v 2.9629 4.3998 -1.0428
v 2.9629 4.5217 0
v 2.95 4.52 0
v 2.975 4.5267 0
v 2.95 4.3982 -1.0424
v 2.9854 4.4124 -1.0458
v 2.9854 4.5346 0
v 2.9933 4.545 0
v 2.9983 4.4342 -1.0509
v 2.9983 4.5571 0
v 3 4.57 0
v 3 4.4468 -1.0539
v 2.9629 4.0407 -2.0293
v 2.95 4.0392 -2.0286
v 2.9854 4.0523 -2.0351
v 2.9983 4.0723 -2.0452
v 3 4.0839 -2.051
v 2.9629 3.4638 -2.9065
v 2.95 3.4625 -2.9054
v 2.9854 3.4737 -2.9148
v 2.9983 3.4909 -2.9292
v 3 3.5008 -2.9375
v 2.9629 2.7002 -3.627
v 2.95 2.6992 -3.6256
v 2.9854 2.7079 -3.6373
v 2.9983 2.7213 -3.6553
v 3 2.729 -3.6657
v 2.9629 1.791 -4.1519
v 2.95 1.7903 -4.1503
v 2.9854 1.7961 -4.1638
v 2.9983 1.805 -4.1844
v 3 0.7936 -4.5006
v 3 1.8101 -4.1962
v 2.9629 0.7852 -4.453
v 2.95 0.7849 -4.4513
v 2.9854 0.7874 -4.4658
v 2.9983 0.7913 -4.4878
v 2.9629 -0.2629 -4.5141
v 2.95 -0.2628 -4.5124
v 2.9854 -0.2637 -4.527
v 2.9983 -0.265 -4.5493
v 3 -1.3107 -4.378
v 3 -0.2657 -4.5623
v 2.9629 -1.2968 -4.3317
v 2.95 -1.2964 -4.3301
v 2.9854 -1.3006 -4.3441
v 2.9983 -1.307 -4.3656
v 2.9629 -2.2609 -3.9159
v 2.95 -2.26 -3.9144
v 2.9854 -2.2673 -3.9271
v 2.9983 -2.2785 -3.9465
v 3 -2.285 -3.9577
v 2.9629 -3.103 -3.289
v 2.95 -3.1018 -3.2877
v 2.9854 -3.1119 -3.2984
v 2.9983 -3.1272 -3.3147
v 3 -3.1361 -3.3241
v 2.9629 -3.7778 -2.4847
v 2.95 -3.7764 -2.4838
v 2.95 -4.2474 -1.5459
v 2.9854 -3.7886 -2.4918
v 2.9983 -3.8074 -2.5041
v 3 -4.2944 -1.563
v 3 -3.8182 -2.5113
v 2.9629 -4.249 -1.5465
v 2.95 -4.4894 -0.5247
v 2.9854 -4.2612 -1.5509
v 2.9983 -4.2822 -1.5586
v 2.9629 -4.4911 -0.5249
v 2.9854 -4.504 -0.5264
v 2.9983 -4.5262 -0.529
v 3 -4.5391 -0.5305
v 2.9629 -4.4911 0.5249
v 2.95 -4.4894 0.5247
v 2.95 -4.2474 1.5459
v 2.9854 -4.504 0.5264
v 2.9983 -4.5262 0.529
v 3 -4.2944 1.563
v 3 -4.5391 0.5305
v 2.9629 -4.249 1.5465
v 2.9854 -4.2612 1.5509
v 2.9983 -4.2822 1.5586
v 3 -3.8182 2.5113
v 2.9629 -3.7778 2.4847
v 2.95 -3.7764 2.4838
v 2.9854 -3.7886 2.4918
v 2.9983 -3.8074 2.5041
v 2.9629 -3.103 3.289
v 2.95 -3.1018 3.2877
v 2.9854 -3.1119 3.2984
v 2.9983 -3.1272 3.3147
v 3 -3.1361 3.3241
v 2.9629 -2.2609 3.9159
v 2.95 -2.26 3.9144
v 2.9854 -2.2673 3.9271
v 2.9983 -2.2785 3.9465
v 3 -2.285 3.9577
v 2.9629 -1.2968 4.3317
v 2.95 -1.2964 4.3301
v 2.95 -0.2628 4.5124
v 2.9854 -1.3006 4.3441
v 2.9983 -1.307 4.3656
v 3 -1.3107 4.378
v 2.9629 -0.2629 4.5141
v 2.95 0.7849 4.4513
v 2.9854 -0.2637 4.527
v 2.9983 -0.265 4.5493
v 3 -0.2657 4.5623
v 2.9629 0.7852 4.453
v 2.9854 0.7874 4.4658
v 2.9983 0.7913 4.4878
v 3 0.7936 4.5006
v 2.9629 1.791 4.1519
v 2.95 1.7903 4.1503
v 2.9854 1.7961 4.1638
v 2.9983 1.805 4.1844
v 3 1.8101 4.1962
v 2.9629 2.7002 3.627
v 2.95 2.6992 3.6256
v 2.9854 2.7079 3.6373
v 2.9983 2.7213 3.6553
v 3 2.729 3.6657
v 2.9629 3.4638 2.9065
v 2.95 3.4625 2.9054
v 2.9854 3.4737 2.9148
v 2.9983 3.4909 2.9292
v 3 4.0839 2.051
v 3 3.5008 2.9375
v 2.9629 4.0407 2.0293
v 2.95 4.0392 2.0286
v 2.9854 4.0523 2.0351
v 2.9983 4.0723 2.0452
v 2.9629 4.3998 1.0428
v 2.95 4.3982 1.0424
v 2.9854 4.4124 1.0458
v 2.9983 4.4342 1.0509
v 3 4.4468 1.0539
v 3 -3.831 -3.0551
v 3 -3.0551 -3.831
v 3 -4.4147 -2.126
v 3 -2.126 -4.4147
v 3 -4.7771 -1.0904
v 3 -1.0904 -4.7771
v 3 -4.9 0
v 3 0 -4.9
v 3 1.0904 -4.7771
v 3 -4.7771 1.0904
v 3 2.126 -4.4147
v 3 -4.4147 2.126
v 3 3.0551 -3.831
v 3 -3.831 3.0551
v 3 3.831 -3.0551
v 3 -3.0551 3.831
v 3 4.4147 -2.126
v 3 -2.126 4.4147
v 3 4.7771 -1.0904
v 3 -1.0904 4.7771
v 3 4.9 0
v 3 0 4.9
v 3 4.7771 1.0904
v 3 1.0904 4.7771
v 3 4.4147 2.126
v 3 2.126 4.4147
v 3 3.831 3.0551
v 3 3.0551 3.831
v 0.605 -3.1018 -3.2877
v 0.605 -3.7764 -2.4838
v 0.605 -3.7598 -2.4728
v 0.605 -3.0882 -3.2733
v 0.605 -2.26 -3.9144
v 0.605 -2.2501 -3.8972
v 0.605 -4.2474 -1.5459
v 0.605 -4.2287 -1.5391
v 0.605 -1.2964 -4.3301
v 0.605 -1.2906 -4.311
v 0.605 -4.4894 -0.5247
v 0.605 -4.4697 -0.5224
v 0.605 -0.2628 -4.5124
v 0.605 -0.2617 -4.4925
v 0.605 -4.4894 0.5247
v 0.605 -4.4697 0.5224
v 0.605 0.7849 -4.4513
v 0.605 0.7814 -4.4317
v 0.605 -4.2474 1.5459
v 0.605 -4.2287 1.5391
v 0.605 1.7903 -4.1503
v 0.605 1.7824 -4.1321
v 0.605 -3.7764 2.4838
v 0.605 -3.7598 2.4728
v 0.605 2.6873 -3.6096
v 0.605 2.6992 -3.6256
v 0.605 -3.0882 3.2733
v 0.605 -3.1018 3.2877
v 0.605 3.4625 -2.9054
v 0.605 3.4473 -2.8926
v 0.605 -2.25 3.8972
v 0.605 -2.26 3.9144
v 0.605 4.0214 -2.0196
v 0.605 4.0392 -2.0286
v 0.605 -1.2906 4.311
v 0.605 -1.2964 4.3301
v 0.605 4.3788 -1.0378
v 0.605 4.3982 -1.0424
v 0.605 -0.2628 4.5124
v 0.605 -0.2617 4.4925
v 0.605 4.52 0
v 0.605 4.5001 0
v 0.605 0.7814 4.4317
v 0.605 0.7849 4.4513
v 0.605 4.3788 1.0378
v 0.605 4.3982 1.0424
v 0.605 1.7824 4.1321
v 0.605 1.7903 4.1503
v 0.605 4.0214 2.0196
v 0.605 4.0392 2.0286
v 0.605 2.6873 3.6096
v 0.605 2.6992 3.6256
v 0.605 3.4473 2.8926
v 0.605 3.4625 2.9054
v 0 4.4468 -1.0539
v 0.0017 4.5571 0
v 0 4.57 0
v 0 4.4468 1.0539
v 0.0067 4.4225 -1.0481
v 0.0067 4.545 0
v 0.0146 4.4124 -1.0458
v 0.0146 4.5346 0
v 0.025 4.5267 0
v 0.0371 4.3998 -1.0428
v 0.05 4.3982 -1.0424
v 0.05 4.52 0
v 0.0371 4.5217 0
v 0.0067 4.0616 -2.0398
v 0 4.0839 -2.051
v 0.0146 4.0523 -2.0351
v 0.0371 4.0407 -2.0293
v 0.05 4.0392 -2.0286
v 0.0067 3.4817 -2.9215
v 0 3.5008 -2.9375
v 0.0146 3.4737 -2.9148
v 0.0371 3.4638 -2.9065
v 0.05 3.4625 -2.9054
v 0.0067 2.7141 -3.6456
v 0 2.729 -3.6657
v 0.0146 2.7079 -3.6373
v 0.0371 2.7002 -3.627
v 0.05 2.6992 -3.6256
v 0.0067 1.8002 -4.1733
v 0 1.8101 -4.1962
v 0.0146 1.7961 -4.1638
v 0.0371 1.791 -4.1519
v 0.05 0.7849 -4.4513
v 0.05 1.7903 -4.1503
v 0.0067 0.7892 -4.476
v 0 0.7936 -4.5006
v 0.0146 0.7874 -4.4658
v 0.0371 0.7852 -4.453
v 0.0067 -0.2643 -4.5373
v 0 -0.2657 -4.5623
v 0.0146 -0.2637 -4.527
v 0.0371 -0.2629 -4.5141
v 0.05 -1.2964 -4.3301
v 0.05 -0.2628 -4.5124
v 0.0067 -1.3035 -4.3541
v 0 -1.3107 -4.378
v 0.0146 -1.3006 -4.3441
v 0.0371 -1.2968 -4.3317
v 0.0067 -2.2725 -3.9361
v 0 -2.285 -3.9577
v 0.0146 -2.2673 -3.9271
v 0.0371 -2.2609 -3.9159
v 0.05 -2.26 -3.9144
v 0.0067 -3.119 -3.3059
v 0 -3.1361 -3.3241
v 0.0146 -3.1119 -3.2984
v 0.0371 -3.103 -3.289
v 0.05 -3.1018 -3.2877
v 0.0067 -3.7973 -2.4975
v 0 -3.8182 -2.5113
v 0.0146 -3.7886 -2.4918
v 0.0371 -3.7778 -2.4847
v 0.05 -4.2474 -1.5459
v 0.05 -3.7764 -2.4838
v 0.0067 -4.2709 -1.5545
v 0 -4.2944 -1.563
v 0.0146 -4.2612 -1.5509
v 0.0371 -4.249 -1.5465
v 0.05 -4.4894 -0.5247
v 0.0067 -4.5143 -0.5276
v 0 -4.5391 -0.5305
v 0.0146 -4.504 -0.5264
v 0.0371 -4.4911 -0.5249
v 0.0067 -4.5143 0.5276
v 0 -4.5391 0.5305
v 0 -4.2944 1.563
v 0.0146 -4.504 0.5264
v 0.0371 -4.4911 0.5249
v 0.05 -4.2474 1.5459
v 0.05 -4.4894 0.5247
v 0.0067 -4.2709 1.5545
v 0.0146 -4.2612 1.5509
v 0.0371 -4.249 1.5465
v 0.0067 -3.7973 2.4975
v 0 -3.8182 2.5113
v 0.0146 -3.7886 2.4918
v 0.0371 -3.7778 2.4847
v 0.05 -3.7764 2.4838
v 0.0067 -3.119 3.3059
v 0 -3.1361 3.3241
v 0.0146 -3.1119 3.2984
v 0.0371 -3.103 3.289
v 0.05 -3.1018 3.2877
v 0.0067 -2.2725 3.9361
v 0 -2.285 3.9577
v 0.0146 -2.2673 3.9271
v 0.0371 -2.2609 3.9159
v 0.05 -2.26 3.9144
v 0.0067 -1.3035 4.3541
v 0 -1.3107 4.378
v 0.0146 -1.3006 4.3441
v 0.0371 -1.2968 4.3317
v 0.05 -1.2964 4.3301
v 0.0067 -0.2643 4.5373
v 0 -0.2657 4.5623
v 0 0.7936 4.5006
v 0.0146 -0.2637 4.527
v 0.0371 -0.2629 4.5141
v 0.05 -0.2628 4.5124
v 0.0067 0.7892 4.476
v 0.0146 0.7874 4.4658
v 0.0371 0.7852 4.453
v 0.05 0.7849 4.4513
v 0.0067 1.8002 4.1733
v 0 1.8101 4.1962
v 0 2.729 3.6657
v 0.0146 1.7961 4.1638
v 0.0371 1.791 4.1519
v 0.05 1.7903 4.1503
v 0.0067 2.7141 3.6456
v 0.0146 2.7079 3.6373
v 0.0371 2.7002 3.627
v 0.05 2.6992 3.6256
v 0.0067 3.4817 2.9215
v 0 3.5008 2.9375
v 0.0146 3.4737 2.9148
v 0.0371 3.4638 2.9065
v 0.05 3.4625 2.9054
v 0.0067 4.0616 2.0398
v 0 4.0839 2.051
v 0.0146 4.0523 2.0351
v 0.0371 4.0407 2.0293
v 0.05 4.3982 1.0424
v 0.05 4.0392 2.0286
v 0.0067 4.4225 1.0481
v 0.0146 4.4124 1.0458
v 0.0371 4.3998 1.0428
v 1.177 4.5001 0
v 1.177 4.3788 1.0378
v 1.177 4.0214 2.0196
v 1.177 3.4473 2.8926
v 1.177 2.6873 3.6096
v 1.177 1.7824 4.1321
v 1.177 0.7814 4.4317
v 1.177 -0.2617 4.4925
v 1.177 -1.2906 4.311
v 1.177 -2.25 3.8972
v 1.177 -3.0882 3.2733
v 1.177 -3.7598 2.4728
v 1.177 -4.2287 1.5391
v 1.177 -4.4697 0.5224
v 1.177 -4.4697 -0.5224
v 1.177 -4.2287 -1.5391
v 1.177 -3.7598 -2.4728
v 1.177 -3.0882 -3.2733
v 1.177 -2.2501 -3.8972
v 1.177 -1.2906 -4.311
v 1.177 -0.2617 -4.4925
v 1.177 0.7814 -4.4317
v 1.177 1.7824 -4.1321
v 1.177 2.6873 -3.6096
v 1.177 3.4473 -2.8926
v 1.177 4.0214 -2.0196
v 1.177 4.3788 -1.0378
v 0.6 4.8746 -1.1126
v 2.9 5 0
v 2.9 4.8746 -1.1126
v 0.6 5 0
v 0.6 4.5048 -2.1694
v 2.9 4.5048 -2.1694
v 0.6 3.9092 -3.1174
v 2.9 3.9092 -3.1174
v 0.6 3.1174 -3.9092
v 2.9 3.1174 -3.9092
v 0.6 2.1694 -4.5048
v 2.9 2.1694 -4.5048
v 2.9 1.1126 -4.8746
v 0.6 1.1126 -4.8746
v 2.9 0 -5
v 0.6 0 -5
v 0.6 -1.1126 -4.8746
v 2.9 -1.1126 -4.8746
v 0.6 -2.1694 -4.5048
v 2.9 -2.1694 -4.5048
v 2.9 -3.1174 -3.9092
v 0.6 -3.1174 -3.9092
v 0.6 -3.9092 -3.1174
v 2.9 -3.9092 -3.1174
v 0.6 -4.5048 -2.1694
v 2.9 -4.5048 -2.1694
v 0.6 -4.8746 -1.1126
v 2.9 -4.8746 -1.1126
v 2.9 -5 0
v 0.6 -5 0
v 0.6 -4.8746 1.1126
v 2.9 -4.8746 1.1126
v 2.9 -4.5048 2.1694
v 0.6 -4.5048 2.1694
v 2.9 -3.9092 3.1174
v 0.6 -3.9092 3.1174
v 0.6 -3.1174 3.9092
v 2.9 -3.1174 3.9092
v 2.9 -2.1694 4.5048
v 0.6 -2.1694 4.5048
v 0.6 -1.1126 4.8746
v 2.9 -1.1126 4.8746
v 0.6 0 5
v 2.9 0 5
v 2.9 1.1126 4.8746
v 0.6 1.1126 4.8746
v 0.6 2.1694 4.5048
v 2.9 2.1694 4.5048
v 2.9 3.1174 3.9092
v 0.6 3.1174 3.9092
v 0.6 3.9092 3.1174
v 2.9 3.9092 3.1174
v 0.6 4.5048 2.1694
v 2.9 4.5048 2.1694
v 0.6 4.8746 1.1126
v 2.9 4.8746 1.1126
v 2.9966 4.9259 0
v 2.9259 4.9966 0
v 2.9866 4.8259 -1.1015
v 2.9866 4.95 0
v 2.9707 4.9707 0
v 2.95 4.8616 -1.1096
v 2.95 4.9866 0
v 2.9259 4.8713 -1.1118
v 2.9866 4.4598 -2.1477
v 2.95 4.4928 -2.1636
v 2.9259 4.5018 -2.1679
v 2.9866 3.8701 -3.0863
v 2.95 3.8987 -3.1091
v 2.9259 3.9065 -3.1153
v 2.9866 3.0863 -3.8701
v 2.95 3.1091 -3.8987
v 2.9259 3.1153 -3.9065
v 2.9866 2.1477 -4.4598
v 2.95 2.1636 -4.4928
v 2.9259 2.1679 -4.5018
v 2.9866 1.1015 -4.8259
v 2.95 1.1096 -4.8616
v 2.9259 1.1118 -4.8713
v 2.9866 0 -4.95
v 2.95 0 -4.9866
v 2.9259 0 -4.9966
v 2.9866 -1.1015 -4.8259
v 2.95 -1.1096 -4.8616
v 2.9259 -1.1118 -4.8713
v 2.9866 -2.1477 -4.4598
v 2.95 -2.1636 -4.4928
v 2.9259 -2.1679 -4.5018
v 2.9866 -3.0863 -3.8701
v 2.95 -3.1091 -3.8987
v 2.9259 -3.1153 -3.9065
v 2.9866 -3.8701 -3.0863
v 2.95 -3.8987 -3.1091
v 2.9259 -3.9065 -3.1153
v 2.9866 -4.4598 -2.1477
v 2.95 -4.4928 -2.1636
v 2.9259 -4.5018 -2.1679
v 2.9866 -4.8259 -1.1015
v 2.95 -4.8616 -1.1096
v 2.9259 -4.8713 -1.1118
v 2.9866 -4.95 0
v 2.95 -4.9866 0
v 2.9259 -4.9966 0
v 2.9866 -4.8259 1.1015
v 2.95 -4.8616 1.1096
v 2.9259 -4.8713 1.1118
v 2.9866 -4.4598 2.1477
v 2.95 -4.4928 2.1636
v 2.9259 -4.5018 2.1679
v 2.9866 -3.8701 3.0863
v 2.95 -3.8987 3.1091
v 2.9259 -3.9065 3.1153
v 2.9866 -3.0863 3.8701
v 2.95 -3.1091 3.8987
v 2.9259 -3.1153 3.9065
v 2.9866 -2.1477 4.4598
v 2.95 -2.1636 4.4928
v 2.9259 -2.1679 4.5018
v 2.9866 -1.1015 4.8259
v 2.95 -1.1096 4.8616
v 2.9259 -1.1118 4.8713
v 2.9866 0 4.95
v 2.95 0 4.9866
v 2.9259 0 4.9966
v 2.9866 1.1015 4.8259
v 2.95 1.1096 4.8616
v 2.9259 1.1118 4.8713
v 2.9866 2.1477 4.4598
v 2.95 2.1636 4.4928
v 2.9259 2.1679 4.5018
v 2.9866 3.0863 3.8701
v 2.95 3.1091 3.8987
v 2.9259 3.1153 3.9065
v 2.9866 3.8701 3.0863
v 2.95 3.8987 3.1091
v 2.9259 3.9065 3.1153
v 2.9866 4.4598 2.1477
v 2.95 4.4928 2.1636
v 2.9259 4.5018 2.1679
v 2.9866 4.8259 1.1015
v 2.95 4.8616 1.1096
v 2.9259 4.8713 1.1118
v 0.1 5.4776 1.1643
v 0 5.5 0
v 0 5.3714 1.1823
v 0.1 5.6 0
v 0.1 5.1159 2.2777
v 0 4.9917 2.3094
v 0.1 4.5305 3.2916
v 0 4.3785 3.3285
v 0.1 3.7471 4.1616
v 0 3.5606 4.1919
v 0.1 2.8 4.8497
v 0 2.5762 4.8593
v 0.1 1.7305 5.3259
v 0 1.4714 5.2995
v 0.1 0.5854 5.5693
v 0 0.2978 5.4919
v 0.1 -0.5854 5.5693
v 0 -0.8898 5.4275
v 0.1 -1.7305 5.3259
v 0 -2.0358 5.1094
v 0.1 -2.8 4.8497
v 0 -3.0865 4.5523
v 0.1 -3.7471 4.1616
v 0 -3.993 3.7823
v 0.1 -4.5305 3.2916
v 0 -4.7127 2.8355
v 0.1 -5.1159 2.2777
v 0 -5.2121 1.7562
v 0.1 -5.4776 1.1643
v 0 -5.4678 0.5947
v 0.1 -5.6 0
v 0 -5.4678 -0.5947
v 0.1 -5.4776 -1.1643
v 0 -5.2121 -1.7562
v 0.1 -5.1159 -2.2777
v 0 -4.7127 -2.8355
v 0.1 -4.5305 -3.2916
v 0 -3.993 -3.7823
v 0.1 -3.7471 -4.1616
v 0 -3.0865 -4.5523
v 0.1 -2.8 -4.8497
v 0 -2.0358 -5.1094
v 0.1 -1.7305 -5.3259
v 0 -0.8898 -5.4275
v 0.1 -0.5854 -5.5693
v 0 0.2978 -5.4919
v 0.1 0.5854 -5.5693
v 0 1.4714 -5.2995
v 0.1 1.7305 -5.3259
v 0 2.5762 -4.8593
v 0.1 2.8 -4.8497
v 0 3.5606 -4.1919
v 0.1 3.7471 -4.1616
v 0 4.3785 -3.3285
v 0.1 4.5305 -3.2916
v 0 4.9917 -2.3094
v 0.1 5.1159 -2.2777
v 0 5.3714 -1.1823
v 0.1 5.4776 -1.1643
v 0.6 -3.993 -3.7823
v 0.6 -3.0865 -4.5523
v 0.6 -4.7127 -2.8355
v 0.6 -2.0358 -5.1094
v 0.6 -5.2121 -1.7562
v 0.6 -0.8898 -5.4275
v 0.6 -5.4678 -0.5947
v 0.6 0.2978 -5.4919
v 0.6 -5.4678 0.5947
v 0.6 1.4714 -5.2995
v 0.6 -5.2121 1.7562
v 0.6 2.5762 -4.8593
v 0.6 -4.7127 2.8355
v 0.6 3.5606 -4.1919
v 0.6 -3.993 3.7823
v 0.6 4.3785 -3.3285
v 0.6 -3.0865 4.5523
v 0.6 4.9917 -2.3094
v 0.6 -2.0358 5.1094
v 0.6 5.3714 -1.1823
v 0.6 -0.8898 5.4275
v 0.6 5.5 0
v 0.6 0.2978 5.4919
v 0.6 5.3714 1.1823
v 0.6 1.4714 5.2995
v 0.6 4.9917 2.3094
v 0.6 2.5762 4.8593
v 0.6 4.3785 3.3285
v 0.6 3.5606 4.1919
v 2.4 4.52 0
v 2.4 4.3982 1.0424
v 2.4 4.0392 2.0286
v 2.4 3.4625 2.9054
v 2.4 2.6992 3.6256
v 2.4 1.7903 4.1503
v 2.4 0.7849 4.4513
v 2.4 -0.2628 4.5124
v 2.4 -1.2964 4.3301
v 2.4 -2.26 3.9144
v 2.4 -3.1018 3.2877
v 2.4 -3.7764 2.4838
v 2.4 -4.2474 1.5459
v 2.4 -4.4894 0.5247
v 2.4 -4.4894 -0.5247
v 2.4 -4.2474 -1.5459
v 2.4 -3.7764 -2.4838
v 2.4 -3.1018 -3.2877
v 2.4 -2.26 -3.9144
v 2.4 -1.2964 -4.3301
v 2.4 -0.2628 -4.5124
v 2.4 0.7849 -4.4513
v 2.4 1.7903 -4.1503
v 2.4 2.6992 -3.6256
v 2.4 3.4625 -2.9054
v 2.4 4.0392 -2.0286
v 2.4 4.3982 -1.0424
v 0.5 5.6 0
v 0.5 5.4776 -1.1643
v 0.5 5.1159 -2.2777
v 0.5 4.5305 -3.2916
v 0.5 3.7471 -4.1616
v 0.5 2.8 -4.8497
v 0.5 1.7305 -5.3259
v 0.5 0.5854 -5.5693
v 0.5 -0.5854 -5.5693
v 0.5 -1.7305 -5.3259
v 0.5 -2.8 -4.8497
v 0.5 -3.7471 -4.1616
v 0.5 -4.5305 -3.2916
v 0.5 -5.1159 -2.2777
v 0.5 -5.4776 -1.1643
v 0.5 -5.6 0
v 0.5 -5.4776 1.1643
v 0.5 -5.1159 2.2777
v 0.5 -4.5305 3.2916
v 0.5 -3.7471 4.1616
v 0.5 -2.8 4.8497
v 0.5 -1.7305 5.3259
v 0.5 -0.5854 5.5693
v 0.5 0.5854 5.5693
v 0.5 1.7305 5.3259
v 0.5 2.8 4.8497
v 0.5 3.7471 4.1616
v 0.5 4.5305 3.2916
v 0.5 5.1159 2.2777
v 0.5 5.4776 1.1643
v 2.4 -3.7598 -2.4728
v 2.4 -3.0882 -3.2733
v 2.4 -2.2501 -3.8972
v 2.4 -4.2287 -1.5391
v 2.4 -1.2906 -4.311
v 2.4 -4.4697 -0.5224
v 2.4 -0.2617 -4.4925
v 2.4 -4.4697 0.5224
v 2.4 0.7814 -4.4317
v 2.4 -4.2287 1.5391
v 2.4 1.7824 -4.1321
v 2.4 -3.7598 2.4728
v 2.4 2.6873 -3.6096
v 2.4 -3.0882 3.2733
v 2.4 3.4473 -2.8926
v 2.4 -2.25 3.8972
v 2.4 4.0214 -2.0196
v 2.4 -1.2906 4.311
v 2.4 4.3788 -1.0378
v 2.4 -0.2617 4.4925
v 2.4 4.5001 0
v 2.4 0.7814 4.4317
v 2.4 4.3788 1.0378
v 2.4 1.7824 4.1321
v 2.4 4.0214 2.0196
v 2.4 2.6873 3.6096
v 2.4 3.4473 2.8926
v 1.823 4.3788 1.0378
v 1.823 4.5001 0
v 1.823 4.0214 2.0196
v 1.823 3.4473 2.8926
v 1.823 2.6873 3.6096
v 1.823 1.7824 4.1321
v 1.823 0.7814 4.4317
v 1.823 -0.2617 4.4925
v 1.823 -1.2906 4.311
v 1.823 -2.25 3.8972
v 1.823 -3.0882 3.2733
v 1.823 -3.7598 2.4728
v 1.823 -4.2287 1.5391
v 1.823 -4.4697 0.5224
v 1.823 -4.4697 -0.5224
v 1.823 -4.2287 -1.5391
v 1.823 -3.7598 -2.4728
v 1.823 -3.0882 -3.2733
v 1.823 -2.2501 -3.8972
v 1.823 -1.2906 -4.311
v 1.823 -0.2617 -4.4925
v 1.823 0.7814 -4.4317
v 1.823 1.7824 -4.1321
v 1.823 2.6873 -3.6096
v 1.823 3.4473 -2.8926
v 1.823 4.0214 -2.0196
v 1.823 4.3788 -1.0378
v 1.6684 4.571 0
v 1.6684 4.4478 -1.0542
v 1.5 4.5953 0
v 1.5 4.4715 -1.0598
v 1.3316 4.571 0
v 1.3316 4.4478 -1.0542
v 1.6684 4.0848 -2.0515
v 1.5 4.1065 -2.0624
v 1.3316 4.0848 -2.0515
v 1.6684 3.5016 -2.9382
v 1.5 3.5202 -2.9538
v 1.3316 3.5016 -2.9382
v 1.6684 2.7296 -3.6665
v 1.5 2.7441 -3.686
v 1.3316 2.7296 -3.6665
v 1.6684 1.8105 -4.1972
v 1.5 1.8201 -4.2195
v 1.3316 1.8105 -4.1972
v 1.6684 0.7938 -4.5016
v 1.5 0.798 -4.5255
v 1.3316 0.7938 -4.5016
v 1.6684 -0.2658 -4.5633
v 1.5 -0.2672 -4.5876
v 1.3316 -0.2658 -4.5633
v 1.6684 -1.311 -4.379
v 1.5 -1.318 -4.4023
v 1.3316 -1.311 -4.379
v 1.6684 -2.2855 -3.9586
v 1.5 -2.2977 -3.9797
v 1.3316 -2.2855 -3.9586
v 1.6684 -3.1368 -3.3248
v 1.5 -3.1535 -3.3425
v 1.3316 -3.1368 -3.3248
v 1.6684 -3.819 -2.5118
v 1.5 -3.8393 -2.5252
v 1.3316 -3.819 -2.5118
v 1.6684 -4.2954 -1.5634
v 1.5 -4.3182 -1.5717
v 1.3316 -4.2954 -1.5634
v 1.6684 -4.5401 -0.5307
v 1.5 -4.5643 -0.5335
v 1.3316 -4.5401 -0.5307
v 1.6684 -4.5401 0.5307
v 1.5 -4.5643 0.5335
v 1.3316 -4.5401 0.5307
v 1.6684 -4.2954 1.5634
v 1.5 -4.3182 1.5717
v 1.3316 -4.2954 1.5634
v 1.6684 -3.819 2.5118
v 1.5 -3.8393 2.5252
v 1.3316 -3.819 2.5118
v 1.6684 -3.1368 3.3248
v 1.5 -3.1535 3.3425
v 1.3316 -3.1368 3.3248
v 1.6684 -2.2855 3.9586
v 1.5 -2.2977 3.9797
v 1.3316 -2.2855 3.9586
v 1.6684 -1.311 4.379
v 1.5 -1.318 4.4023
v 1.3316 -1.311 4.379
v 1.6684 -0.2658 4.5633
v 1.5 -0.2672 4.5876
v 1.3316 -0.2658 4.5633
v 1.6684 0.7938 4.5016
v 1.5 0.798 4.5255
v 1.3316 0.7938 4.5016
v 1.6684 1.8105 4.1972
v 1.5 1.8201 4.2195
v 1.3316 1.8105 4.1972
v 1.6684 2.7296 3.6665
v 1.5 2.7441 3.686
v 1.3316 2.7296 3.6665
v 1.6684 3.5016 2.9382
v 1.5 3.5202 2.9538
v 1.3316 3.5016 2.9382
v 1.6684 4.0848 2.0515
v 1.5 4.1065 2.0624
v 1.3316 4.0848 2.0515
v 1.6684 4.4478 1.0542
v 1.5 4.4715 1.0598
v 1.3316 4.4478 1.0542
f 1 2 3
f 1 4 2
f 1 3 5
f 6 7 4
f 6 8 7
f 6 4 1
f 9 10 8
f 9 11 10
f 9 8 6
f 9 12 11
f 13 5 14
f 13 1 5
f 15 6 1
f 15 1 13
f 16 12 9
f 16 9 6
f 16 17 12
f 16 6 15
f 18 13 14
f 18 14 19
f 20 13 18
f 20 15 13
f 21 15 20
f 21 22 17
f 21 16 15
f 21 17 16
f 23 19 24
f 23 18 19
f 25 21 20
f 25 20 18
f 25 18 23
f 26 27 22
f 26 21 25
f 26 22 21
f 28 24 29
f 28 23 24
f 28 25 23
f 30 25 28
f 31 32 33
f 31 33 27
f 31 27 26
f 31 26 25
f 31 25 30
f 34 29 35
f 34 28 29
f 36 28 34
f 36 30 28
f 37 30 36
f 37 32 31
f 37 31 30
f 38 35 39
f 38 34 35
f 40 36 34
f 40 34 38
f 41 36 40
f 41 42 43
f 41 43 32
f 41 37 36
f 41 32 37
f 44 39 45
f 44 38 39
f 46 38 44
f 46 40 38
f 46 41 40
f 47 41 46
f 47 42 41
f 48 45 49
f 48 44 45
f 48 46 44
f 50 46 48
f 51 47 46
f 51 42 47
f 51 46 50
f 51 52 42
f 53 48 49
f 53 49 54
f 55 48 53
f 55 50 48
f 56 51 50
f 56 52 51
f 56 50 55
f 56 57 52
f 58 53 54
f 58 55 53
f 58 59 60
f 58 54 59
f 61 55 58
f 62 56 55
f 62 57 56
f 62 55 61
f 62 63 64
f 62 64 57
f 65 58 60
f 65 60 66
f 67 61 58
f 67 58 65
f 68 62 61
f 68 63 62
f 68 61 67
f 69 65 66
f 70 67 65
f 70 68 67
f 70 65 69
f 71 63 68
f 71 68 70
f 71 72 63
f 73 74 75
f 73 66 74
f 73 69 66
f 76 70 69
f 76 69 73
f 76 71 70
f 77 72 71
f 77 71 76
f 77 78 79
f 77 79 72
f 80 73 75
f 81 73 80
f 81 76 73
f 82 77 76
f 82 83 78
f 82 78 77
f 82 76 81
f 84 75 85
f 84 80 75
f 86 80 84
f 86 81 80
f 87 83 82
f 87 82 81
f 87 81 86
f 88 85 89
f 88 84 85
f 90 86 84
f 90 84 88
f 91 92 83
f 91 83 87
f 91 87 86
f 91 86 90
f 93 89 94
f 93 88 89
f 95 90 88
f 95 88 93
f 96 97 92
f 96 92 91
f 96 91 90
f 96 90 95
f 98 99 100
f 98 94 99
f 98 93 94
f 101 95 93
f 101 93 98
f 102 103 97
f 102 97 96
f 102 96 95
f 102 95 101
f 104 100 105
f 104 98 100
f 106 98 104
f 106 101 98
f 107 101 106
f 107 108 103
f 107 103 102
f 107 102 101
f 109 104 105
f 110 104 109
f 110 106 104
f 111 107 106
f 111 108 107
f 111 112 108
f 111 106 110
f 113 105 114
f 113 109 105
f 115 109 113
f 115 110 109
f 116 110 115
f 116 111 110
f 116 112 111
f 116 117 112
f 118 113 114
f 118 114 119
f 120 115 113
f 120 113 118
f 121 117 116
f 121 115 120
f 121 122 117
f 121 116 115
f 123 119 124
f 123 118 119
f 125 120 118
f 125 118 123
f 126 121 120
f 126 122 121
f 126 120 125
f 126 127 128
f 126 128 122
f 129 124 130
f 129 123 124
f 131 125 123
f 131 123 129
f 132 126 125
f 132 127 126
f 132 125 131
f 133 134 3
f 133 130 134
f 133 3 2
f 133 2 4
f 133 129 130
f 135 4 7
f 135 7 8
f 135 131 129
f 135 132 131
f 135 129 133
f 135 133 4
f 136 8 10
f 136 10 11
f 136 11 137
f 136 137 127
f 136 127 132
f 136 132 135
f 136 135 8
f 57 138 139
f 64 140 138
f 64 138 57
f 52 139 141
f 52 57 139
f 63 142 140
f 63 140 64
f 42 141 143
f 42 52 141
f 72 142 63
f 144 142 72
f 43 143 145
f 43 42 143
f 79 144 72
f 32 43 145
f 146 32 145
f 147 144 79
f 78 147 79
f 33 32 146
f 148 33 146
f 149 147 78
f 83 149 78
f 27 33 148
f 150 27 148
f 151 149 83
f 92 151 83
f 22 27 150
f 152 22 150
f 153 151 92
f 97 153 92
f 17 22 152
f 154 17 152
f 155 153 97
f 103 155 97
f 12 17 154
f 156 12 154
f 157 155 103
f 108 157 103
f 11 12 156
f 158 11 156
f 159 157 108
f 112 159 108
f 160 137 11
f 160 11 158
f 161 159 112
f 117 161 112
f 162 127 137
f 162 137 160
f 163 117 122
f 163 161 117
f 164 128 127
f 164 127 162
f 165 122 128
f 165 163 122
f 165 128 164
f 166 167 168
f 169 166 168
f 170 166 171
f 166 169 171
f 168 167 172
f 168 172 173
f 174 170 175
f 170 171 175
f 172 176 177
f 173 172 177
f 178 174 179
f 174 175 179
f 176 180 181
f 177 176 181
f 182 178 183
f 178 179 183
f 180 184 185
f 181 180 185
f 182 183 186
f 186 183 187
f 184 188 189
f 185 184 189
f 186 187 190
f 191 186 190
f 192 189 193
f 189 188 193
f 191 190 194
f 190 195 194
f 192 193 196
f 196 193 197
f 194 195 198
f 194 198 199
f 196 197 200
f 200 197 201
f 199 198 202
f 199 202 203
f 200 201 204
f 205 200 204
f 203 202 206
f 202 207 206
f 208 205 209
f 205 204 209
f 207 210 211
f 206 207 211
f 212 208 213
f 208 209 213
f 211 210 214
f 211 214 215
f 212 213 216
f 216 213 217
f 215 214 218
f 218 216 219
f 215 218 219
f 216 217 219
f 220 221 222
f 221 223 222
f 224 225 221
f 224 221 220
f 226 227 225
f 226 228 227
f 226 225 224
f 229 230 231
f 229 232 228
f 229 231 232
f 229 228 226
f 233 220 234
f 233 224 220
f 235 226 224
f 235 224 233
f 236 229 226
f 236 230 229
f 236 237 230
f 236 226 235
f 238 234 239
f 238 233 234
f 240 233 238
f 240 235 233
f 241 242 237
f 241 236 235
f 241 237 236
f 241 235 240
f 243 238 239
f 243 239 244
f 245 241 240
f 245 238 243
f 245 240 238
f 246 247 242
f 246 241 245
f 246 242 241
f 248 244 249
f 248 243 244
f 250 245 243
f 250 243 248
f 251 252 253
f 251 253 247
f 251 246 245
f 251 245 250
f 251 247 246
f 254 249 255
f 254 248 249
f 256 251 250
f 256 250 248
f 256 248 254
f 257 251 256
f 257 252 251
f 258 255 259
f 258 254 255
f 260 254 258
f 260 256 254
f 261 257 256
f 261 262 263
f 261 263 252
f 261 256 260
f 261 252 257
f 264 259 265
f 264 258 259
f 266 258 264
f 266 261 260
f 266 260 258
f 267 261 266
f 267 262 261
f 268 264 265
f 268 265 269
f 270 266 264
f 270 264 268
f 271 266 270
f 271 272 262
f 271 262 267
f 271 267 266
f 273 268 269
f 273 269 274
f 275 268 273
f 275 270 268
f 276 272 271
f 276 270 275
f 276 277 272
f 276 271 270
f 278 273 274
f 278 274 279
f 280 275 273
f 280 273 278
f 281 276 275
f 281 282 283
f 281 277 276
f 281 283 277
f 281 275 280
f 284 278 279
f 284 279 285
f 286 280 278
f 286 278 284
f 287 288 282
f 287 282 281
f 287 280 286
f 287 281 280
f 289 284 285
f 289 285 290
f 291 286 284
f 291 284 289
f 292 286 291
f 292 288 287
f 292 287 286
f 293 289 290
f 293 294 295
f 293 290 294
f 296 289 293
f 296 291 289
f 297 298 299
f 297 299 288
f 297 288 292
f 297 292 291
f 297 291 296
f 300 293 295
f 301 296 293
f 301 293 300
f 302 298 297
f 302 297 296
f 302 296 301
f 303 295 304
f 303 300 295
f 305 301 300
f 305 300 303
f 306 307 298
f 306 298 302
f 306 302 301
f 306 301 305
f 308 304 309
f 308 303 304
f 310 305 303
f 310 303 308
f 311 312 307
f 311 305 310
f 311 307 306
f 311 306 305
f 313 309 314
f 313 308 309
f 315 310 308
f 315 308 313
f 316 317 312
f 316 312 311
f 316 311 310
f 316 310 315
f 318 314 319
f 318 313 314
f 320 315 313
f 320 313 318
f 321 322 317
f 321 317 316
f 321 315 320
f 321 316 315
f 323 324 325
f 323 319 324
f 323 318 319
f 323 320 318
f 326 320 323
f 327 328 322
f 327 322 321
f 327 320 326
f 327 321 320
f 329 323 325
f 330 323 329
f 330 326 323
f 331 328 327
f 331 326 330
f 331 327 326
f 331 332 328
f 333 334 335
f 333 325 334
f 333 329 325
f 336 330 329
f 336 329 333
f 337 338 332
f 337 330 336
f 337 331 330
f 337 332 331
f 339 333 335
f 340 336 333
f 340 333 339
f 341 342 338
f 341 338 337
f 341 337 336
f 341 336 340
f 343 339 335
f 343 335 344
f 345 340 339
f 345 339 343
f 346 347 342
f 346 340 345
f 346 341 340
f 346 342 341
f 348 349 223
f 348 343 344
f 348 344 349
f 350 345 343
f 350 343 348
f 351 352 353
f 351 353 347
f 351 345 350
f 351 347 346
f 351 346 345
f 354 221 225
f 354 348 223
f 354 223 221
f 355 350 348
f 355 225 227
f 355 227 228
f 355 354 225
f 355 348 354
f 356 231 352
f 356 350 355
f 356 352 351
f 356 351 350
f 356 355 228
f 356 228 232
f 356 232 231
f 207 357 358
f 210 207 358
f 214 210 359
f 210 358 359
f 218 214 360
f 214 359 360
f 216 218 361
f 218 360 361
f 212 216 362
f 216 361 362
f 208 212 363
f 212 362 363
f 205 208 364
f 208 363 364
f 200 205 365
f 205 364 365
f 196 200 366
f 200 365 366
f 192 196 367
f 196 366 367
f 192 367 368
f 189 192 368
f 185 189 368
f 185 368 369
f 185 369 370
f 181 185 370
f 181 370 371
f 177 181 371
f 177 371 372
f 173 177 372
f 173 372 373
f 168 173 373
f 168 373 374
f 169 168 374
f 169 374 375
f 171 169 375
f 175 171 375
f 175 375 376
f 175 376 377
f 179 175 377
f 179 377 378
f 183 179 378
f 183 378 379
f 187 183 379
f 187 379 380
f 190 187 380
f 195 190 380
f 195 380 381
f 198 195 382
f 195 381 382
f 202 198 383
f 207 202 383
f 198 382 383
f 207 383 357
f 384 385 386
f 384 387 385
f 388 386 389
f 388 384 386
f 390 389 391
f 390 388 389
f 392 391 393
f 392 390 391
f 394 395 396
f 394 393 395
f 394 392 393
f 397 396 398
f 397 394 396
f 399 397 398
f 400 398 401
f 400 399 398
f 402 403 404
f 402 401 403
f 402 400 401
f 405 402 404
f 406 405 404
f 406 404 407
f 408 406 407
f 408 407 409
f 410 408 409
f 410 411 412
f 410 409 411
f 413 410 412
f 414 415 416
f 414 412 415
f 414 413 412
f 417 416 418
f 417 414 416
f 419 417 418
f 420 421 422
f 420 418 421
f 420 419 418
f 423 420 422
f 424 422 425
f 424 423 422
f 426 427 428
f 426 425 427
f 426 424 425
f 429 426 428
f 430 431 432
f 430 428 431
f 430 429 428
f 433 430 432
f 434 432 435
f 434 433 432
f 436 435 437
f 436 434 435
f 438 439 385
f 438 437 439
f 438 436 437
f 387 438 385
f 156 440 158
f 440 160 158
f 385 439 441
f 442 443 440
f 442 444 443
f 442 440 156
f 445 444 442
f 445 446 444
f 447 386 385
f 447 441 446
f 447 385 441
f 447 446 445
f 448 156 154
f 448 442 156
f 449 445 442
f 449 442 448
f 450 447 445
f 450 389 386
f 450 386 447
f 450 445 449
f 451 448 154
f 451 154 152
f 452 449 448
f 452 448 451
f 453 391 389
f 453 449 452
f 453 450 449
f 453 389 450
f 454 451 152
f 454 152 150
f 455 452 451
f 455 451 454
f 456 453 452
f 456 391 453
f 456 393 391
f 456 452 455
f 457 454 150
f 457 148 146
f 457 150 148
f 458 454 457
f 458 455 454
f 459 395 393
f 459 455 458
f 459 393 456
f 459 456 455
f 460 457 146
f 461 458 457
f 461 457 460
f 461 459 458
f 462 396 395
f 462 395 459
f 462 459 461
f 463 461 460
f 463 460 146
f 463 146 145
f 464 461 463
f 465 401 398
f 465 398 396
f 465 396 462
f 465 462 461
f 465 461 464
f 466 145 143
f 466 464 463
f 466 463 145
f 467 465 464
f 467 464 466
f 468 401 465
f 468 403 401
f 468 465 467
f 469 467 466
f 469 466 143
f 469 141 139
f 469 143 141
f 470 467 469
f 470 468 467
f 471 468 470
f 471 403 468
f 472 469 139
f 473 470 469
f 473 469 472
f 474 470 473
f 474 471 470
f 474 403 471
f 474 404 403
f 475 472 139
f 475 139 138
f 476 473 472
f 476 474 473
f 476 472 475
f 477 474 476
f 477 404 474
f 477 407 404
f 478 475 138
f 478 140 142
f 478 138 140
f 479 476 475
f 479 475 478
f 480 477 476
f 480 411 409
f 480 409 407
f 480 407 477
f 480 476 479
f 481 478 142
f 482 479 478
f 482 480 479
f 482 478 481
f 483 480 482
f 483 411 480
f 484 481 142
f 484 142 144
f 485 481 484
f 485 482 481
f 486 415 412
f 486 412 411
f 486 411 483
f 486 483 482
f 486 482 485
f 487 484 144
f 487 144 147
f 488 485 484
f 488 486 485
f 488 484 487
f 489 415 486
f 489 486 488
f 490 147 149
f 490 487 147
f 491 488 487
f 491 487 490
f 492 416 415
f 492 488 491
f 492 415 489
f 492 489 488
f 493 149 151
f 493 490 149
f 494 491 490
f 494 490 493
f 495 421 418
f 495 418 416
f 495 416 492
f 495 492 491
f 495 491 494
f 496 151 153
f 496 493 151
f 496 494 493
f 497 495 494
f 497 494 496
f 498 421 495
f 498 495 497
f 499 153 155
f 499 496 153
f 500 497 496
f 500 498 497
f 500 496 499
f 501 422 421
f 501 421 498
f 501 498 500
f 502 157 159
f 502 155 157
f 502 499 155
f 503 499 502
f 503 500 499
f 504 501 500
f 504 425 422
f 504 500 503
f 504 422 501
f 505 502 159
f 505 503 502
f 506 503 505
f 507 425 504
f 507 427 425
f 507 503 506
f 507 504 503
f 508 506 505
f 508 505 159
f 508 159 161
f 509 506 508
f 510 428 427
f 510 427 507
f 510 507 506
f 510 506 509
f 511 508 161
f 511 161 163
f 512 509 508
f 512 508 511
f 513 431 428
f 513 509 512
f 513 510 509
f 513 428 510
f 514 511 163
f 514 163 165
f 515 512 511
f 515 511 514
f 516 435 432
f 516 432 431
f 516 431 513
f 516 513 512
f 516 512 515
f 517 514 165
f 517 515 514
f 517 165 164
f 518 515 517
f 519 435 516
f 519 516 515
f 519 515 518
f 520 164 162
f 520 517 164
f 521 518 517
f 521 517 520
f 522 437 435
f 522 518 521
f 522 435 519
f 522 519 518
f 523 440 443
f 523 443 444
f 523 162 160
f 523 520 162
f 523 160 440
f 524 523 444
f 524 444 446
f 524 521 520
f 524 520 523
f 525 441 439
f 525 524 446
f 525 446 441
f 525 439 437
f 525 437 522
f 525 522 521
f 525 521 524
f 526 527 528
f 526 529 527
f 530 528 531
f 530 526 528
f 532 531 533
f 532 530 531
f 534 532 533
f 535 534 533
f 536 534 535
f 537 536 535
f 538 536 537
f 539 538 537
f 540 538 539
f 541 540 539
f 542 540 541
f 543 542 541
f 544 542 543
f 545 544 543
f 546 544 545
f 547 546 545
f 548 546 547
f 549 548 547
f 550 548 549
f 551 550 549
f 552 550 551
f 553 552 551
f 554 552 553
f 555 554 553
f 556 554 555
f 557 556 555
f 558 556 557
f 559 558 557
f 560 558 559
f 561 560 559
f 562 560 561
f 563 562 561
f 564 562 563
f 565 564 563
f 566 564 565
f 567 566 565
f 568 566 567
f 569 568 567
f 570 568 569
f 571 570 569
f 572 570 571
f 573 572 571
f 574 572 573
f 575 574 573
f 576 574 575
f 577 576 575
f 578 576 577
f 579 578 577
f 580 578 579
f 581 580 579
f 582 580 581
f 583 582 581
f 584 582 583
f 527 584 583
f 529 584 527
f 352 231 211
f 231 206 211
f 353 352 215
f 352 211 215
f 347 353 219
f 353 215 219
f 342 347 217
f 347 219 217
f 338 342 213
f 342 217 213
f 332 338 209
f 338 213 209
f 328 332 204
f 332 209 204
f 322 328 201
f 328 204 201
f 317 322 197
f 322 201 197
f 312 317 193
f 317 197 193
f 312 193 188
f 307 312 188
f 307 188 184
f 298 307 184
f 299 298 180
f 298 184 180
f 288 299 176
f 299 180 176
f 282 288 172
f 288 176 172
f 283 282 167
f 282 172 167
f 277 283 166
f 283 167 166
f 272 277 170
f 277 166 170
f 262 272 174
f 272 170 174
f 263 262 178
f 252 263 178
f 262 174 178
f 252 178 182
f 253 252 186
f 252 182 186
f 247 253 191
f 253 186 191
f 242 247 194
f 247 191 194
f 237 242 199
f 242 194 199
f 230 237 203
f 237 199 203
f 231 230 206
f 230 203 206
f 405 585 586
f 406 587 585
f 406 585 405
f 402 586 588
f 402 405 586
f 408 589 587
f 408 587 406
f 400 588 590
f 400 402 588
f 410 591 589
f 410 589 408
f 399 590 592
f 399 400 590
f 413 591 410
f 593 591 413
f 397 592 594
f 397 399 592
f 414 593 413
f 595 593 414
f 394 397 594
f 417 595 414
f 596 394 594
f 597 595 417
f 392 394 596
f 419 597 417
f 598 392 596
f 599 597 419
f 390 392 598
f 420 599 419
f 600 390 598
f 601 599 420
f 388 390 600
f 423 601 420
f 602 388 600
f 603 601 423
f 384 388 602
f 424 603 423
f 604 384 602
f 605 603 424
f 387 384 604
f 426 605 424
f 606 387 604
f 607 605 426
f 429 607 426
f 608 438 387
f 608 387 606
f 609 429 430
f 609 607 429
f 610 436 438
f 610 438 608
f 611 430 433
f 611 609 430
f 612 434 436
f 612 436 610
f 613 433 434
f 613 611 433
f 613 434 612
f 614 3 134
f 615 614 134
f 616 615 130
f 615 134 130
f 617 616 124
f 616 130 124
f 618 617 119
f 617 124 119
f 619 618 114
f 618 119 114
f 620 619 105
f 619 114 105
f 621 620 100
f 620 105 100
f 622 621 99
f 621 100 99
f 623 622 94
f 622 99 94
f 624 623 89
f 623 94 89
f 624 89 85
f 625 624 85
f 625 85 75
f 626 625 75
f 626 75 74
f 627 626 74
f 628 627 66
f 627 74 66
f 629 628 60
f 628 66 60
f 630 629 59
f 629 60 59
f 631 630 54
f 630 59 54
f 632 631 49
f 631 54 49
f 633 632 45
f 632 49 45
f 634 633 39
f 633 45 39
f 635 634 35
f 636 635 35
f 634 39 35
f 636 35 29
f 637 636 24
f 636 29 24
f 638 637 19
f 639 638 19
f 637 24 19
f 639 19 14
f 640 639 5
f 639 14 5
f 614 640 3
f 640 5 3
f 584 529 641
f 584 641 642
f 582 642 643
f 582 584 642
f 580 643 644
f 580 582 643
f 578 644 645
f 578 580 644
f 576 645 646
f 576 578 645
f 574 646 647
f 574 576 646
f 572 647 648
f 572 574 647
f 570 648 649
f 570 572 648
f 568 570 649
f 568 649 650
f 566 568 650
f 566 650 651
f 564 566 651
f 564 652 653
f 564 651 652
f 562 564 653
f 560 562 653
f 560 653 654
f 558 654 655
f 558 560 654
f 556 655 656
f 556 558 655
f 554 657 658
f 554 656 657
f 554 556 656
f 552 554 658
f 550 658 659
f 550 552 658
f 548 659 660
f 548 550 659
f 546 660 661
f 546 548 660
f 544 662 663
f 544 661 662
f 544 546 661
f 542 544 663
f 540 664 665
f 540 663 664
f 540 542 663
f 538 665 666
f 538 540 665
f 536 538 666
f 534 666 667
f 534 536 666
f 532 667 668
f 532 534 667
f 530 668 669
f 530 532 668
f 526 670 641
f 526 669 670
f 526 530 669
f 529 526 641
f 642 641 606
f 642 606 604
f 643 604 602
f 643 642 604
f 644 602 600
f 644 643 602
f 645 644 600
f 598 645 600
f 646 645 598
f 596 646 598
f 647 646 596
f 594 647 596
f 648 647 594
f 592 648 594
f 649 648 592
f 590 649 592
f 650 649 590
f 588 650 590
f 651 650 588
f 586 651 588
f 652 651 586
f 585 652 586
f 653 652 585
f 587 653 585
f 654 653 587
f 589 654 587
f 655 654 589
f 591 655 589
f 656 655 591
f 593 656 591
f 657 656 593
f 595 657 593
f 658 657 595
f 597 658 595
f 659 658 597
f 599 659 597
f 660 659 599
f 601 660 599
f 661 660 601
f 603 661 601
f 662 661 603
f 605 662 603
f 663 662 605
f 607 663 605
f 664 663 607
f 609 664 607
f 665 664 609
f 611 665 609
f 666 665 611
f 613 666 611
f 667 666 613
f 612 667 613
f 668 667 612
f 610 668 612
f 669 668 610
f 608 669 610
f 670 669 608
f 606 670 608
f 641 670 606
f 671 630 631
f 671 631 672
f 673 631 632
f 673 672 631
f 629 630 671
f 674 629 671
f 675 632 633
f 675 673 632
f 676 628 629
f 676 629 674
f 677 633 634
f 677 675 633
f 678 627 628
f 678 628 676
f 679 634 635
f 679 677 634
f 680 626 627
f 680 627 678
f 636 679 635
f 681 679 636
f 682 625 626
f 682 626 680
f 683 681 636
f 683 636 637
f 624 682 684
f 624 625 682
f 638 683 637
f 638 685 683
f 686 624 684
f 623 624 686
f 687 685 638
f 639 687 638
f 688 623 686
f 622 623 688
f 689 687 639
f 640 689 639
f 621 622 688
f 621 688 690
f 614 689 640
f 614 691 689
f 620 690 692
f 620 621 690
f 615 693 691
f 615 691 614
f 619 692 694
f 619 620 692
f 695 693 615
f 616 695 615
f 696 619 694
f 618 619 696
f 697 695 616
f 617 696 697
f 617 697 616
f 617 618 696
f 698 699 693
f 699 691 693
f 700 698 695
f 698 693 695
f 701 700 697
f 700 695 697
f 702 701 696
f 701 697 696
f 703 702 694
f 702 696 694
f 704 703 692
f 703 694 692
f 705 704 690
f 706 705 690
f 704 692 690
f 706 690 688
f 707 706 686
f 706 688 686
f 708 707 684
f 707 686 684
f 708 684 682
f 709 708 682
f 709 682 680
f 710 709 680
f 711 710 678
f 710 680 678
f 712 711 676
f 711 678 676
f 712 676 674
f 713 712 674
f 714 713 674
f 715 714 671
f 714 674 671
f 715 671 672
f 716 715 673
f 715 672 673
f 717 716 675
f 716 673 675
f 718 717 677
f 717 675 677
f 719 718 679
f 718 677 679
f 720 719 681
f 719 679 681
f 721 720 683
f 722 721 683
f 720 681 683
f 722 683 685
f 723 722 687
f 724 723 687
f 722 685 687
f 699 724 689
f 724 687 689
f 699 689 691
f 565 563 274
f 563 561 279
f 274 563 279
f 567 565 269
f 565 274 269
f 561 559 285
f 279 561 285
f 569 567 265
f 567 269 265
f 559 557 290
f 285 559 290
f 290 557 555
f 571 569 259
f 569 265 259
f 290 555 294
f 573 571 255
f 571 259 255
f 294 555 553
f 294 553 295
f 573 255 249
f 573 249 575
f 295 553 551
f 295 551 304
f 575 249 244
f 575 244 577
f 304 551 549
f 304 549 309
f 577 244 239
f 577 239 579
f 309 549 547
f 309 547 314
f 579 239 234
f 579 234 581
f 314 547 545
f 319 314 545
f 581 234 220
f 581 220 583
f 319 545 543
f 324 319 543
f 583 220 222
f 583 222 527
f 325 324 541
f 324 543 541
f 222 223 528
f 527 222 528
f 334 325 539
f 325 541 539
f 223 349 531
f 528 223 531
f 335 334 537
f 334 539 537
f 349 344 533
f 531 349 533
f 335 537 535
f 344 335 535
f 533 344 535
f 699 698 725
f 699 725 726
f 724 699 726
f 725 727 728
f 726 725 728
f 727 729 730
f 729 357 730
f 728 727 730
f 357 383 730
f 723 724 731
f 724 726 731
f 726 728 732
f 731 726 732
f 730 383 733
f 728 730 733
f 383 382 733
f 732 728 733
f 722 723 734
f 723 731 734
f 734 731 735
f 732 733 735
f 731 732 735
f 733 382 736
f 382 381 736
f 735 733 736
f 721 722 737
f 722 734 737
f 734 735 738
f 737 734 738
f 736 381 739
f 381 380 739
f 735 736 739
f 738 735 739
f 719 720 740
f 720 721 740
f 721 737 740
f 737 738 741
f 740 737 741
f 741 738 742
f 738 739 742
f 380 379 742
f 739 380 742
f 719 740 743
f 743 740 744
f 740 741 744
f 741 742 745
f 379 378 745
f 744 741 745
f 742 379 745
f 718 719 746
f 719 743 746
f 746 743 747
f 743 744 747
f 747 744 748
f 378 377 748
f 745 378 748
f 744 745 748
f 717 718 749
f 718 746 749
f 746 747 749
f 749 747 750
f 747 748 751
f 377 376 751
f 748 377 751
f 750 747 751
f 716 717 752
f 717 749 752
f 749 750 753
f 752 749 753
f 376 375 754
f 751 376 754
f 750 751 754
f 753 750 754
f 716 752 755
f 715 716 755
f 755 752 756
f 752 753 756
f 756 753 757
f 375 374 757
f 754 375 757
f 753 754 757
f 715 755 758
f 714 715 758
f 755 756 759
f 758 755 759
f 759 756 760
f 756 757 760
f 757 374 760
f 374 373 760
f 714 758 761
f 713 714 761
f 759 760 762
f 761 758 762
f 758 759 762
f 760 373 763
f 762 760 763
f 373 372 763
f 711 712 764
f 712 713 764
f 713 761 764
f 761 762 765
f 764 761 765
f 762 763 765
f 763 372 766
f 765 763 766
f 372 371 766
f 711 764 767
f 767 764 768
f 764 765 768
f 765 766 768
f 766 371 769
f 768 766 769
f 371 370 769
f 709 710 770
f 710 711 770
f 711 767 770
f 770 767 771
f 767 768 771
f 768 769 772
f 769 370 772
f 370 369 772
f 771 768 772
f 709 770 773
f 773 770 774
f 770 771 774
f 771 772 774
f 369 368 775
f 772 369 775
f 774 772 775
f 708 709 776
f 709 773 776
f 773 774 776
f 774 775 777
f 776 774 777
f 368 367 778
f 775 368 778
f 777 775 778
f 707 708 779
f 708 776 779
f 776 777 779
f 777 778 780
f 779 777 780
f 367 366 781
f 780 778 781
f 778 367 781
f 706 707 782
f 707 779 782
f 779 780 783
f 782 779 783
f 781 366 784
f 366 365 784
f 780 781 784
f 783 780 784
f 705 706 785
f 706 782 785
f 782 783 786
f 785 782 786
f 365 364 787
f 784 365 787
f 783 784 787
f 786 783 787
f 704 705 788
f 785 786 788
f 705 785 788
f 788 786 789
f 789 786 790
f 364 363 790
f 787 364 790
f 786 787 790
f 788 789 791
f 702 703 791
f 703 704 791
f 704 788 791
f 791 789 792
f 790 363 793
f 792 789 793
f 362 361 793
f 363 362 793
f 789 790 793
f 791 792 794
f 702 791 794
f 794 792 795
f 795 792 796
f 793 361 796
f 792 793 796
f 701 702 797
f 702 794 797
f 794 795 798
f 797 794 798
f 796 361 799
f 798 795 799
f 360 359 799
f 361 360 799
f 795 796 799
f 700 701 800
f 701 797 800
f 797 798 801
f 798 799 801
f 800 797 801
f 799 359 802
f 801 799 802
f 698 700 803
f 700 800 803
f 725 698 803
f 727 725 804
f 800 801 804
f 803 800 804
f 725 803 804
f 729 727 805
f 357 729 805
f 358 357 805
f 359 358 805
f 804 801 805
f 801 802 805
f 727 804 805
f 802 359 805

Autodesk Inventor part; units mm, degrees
sketch "Sketch_3" plane through (0, 0, 0) normal (0, 0, 1) x (1, 0, 0)
  line L0 (2.9, 0) -> (0, 0)
  line L1 (0, 5.5) -> (0, 4.57)
  arc A0 (0, 4.57) -> (0.05, 4.52) centre (0.05, 4.57) ccw
  line L2 (0.05, 4.52) -> (0.605, 4.52)
  line L3 (0.605, 4.52) -> (0.605, 4.5001)
  line L4 (0.605, 4.5001) -> (1.177, 4.5001)
  arc A1 (1.823, 4.5001) -> (1.177, 4.5001) centre (1.5, 4) ccw
  line L5 (1.823, 4.5001) -> (2.4, 4.5001)
  line L6 (2.4, 4.5001) -> (2.4, 4.52)
  line L7 (2.4, 4.52) -> (2.95, 4.52)
  arc A2 (2.95, 4.52) -> (3, 4.57) centre (2.95, 4.57) ccw
  line L8 (3, 4.57) -> (3, 4.9)
  arc A3 (3, 4.9) -> (2.9, 5) centre (2.9, 4.9) ccw
  line L9 (2.9, 5) -> (0.6, 5)
  line L10 (0.6, 5) -> (0.6, 5.5)
  line L11 (0.6, 5.5) -> (0.5, 5.6)
  line L12 (0.5, 5.6) -> (0.1, 5.6)
  line L13 (0.1, 5.6) -> (0, 5.5)
revolve "Revolution1" add sketch "Sketch_3" angle 360 about axis through (2.9, 0, 0) along (1, 0, 0)
ref_plane "1_XY" through (1.5, 0, 0) normal (1, 0, 0) x (0, 0, -1)
ref_plane "1_YZ" through (1.5, 0, 0) normal (0, 0, -1) x (0, 1, 0)
ref_plane "1_ZX" through (1.5, 0, 0) normal (0, 1, 0) x (1, 0, 0)
properties part number "LF-1060ZZ_or" material "鋼、炭素鋼"
